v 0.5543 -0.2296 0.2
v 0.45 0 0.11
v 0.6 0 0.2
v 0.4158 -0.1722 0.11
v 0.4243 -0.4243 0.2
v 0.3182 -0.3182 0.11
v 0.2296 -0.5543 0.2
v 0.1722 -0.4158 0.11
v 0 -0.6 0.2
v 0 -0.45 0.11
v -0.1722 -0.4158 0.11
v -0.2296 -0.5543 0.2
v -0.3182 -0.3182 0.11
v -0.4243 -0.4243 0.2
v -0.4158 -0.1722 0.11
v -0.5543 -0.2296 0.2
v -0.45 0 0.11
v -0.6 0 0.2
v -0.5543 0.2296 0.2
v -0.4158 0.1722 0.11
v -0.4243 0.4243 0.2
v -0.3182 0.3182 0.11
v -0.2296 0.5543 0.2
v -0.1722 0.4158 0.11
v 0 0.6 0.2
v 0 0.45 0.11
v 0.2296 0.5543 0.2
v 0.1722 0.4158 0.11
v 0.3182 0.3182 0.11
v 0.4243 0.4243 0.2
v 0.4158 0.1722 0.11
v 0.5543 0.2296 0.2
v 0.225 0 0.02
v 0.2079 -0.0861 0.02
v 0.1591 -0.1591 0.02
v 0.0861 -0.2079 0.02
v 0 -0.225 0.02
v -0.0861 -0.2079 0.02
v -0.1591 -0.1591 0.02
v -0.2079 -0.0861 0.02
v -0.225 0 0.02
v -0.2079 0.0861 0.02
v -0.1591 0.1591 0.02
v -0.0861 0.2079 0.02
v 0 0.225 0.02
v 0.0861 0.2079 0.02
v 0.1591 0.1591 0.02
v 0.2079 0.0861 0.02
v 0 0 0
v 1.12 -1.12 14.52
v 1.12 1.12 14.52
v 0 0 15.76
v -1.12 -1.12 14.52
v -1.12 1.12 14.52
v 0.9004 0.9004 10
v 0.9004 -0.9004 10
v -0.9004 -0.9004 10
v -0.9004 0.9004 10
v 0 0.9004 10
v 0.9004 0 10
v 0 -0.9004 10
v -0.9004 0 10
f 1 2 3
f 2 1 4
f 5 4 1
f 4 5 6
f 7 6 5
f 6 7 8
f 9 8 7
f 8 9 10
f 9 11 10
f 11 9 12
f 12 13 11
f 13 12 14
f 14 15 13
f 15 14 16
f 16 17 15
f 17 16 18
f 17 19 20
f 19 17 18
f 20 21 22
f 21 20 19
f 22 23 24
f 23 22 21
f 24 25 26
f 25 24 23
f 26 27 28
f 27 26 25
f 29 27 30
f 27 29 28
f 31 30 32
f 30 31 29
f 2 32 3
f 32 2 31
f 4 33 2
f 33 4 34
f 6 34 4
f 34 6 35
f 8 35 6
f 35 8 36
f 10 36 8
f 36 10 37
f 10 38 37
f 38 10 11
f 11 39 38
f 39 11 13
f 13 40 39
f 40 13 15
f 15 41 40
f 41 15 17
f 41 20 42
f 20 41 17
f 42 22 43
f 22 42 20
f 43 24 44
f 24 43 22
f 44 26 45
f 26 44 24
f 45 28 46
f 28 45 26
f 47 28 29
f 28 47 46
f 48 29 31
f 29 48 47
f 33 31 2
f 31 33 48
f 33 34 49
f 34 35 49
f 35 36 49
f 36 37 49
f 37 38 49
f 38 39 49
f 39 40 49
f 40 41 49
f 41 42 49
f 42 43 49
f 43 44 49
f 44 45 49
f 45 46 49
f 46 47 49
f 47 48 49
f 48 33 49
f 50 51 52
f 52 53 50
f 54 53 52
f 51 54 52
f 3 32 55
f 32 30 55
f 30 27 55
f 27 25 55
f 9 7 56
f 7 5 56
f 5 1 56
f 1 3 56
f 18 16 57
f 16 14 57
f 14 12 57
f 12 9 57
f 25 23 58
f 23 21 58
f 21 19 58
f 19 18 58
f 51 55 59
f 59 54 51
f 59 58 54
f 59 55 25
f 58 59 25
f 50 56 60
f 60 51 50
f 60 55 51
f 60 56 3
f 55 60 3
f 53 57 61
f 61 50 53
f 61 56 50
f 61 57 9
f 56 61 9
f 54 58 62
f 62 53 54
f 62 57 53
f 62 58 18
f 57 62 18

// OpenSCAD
// file: ../../p/4-4edge.scad
use <../lib.scad>
function ldraw_lib__4_4edge() = [
// 0 Circle 1.0
// 0 Name: 4-4edge.dat
// 0 Author: James Jessiman
// 0 !LDRAW_ORG Primitive UPDATE 2017-01
// 0 !LICENSE Licensed under CC BY 4.0 : see CAreadme.txt
// 
// 0 BFC CERTIFY CCW
  [0,"BFC","CERTIFY"],
  [0,"BFC","CCW"],
// 
// 0 !HISTORY 1998-12-15 [PTadmin] Official Update 1998-10
// 0 !HISTORY 2005-12-28 [PTadmin] Official Update 2005-01
// 0 !HISTORY 2007-06-24 [PTadmin] Header formatted for Contributor Agreement
// 0 !HISTORY 2008-07-01 [PTadmin] Official Update 2008-01
// 0 !HISTORY 2017-01-15 [Steffen] BFCed
// 0 !HISTORY 2017-12-30 [PTadmin] Official Update 2017-01
// 
// 
// 2 24 1 0 0 0.9239 0 0.3827
  [2,24,1,0,0,0.9239,0,0.3827],
// 2 24 0.9239 0 0.3827 0.7071 0 0.7071
  [2,24,0.9239,0,0.3827,0.7071,0,0.7071],
// 2 24 0.7071 0 0.7071 0.3827 0 0.9239
  [2,24,0.7071,0,0.7071,0.3827,0,0.9239],
// 2 24 0.3827 0 0.9239 0 0 1
  [2,24,0.3827,0,0.9239,0,0,1],
// 2 24 0 0 1 -0.3827 0 0.9239
  [2,24,0,0,1,-0.3827,0,0.9239],
// 2 24 -0.3827 0 0.9239 -0.7071 0 0.7071
  [2,24,-0.3827,0,0.9239,-0.7071,0,0.7071],
// 2 24 -0.7071 0 0.7071 -0.9239 0 0.3827
  [2,24,-0.7071,0,0.7071,-0.9239,0,0.3827],
// 2 24 -0.9239 0 0.3827 -1 0 -0
  [2,24,-0.9239,0,0.3827,-1,0,-0],
// 2 24 -1 0 -0 -0.9239 0 -0.3827
  [2,24,-1,0,-0,-0.9239,0,-0.3827],
// 2 24 -0.9239 0 -0.3827 -0.7071 0 -0.7071
  [2,24,-0.9239,0,-0.3827,-0.7071,0,-0.7071],
// 2 24 -0.7071 0 -0.7071 -0.3827 0 -0.9239
  [2,24,-0.7071,0,-0.7071,-0.3827,0,-0.9239],
// 2 24 -0.3827 0 -0.9239 0 0 -1
  [2,24,-0.3827,0,-0.9239,0,0,-1],
// 2 24 0 0 -1 0.3827 0 -0.9239
  [2,24,0,0,-1,0.3827,0,-0.9239],
// 2 24 0.3827 0 -0.9239 0.7071 0 -0.7071
  [2,24,0.3827,0,-0.9239,0.7071,0,-0.7071],
// 2 24 0.7071 0 -0.7071 0.9239 0 -0.3827
  [2,24,0.7071,0,-0.7071,0.9239,0,-0.3827],
// 2 24 0.9239 0 -0.3827 1 0 0
  [2,24,0.9239,0,-0.3827,1,0,0],
];
module ldraw_lib__4_4edge(step=0, col=false, unit=2/5, alt=false, line=0.2, solid=!$preview)
    makepoly(ldraw_lib__4_4edge(), step=step, col=col, unit=unit, alt=alt, line=line, solid=solid);
ldraw_lib__4_4edge(line=0.2);
// file: ../../p/4-4con3.scad
use <../lib.scad>
function ldraw_lib__4_4con3() = [
// 0 Cone  3 x 1.0
// 0 Name: 4-4con3.dat
// 0 Author: Niels Karsdorp [nielsk]
// 0 !LDRAW_ORG Primitive UPDATE 2003-02
// 0 !LICENSE Licensed under CC BY 4.0 : see CAreadme.txt
// 
// 0 BFC CERTIFY CCW
  [0,"BFC","CERTIFY"],
  [0,"BFC","CCW"],
// 
// 0 !HISTORY 2003-08-01 [PTadmin] Official Update 2003-02
// 0 !HISTORY 2007-06-24 [PTadmin] Header formatted for Contributor Agreement
// 0 !HISTORY 2008-07-01 [PTadmin] Official Update 2008-01
// 
// 
// 5 24 3 1 0 4 0 0 2.7717 1 1.1481 2.7717 1 -1.1481
  [5,24,3,1,0,4,0,0,2.7717,1,1.1481,2.7717,1,-1.1481],
// 5 24 2.7717 1 1.1481 3.6956 0 1.5308 2.1213 1 2.1213 3 1 0
  [5,24,2.7717,1,1.1481,3.6956,0,1.5308,2.1213,1,2.1213,3,1,0],
// 5 24 2.1213 1 2.1213 2.8284 0 2.8284 1.1481 1 2.7717 2.7717 1 1.1481
  [5,24,2.1213,1,2.1213,2.8284,0,2.8284,1.1481,1,2.7717,2.7717,1,1.1481],
// 5 24 1.1481 1 2.7717 1.5308 0 3.6956 0 1 3 2.1213 1 2.1213
  [5,24,1.1481,1,2.7717,1.5308,0,3.6956,0,1,3,2.1213,1,2.1213],
// 5 24 0 1 3 0 0 4 -1.1481 1 2.7717 1.1481 1 2.7717
  [5,24,0,1,3,0,0,4,-1.1481,1,2.7717,1.1481,1,2.7717],
// 5 24 -1.1481 1 2.7717 -1.5308 0 3.6956 -2.1213 1 2.1213 0 1 3
  [5,24,-1.1481,1,2.7717,-1.5308,0,3.6956,-2.1213,1,2.1213,0,1,3],
// 5 24 -2.1213 1 2.1213 -2.8284 0 2.8284 -2.7717 1 1.1481 -1.1481 1 2.7717
  [5,24,-2.1213,1,2.1213,-2.8284,0,2.8284,-2.7717,1,1.1481,-1.1481,1,2.7717],
// 5 24 -2.7717 1 1.1481 -3.6956 0 1.5308 -3 1 0 -2.1213 1 2.1213
  [5,24,-2.7717,1,1.1481,-3.6956,0,1.5308,-3,1,0,-2.1213,1,2.1213],
// 5 24 -3 1 0 -4 0 0 -2.7717 1 -1.1481 -2.7717 1 1.1481
  [5,24,-3,1,0,-4,0,0,-2.7717,1,-1.1481,-2.7717,1,1.1481],
// 5 24 -2.7717 1 -1.1481 -3.6956 0 -1.5308 -2.1213 1 -2.1213 -3 1 0
  [5,24,-2.7717,1,-1.1481,-3.6956,0,-1.5308,-2.1213,1,-2.1213,-3,1,0],
// 5 24 -2.1213 1 -2.1213 -2.8284 0 -2.8284 -1.1481 1 -2.7717 -2.7717 1 -1.1481
  [5,24,-2.1213,1,-2.1213,-2.8284,0,-2.8284,-1.1481,1,-2.7717,-2.7717,1,-1.1481],
// 5 24 -1.1481 1 -2.7717 -1.5308 0 -3.6956 0 1 -3 -2.1213 1 -2.1213
  [5,24,-1.1481,1,-2.7717,-1.5308,0,-3.6956,0,1,-3,-2.1213,1,-2.1213],
// 5 24 0 1 -3 0 0 -4 1.1481 1 -2.7717 -1.1481 1 -2.7717
  [5,24,0,1,-3,0,0,-4,1.1481,1,-2.7717,-1.1481,1,-2.7717],
// 5 24 1.1481 1 -2.7717 1.5308 0 -3.6956 2.1213 1 -2.1213 0 1 -3
  [5,24,1.1481,1,-2.7717,1.5308,0,-3.6956,2.1213,1,-2.1213,0,1,-3],
// 5 24 2.1213 1 -2.1213 2.8284 0 -2.8284 2.7717 1 -1.1481 1.1481 1 -2.7717
  [5,24,2.1213,1,-2.1213,2.8284,0,-2.8284,2.7717,1,-1.1481,1.1481,1,-2.7717],
// 5 24 2.7717 1 -1.1481 3.6956 0 -1.5308 3 1 0 2.1213 1 -2.1213
  [5,24,2.7717,1,-1.1481,3.6956,0,-1.5308,3,1,0,2.1213,1,-2.1213],
// 
// 4 16 3 1 0 2.7717 1 1.1481 3.6956 0 1.5308 4 0 0
  [4,16,3,1,0,2.7717,1,1.1481,3.6956,0,1.5308,4,0,0],
// 4 16 2.7717 1 1.1481 2.1213 1 2.1213 2.8284 0 2.8284 3.6956 0 1.5308
  [4,16,2.7717,1,1.1481,2.1213,1,2.1213,2.8284,0,2.8284,3.6956,0,1.5308],
// 4 16 2.1213 1 2.1213 1.1481 1 2.7717 1.5308 0 3.6956 2.8284 0 2.8284
  [4,16,2.1213,1,2.1213,1.1481,1,2.7717,1.5308,0,3.6956,2.8284,0,2.8284],
// 4 16 1.1481 1 2.7717 0 1 3 0 0 4 1.5308 0 3.6956
  [4,16,1.1481,1,2.7717,0,1,3,0,0,4,1.5308,0,3.6956],
// 4 16 0 1 3 -1.1481 1 2.7717 -1.5308 0 3.6956 0 0 4
  [4,16,0,1,3,-1.1481,1,2.7717,-1.5308,0,3.6956,0,0,4],
// 4 16 -1.1481 1 2.7717 -2.1213 1 2.1213 -2.8284 0 2.8284 -1.5308 0 3.6956
  [4,16,-1.1481,1,2.7717,-2.1213,1,2.1213,-2.8284,0,2.8284,-1.5308,0,3.6956],
// 4 16 -2.1213 1 2.1213 -2.7717 1 1.1481 -3.6956 0 1.5308 -2.8284 0 2.8284
  [4,16,-2.1213,1,2.1213,-2.7717,1,1.1481,-3.6956,0,1.5308,-2.8284,0,2.8284],
// 4 16 -2.7717 1 1.1481 -3 1 0 -4 0 0 -3.6956 0 1.5308
  [4,16,-2.7717,1,1.1481,-3,1,0,-4,0,0,-3.6956,0,1.5308],
// 4 16 -3 1 0 -2.7717 1 -1.1481 -3.6956 0 -1.5308 -4 0 0
  [4,16,-3,1,0,-2.7717,1,-1.1481,-3.6956,0,-1.5308,-4,0,0],
// 4 16 -2.7717 1 -1.1481 -2.1213 1 -2.1213 -2.8284 0 -2.8284 -3.6956 0 -1.5308
  [4,16,-2.7717,1,-1.1481,-2.1213,1,-2.1213,-2.8284,0,-2.8284,-3.6956,0,-1.5308],
// 4 16 -2.1213 1 -2.1213 -1.1481 1 -2.7717 -1.5308 0 -3.6956 -2.8284 0 -2.8284
  [4,16,-2.1213,1,-2.1213,-1.1481,1,-2.7717,-1.5308,0,-3.6956,-2.8284,0,-2.8284],
// 4 16 -1.1481 1 -2.7717 0 1 -3 0 0 -4 -1.5308 0 -3.6956
  [4,16,-1.1481,1,-2.7717,0,1,-3,0,0,-4,-1.5308,0,-3.6956],
// 4 16 0 1 -3 1.1481 1 -2.7717 1.5308 0 -3.6956 0 0 -4
  [4,16,0,1,-3,1.1481,1,-2.7717,1.5308,0,-3.6956,0,0,-4],
// 4 16 1.1481 1 -2.7717 2.1213 1 -2.1213 2.8284 0 -2.8284 1.5308 0 -3.6956
  [4,16,1.1481,1,-2.7717,2.1213,1,-2.1213,2.8284,0,-2.8284,1.5308,0,-3.6956],
// 4 16 2.1213 1 -2.1213 2.7717 1 -1.1481 3.6956 0 -1.5308 2.8284 0 -2.8284
  [4,16,2.1213,1,-2.1213,2.7717,1,-1.1481,3.6956,0,-1.5308,2.8284,0,-2.8284],
// 4 16 2.7717 1 -1.1481 3 1 0 4 0 0 3.6956 0 -1.5308
  [4,16,2.7717,1,-1.1481,3,1,0,4,0,0,3.6956,0,-1.5308],
// 
// 0
// 
];
module ldraw_lib__4_4con3(step=0, col=false, unit=2/5, alt=false, line=0.2, solid=!$preview)
    makepoly(ldraw_lib__4_4con3(), step=step, col=col, unit=unit, alt=alt, line=line, solid=solid);
ldraw_lib__4_4con3(line=0.2);
// file: ../../p/4-4con1.scad
use <../lib.scad>
function ldraw_lib__4_4con1() = [
// 0 Cone  1 x 1.0
// 0 Name: 4-4con1.dat
// 0 Author: Steve Bliss [sbliss]
// 0 !LDRAW_ORG Primitive UPDATE 2012-01
// 0 !LICENSE Licensed under CC BY 4.0 : see CAreadme.txt
// 
// 0 BFC CERTIFY CCW
  [0,"BFC","CERTIFY"],
  [0,"BFC","CCW"],
// 
// 0 !HISTORY 1999-08-19 [sbliss] Renamed 4-4con12.dat to 4-4con1.dat, Moved all conditional lines before quads
// 0 !HISTORY 2000-05-07 [PTadmin] Official Update 2000-01
// 0 !HISTORY 2002-12-11 [cwdee] Standardised title and made BFC compliant
// 0 !HISTORY 2003-08-01 [PTadmin] Official Update 2003-02
// 0 !HISTORY 2007-06-24 [PTadmin] Header formatted for Contributor Agreement
// 0 !HISTORY 2008-07-01 [PTadmin] Official Update 2008-01
// 0 !HISTORY 2012-02-16 [Philo] Changed to CCW, reordered
// 0 !HISTORY 2012-03-30 [PTadmin] Official Update 2012-01
// 
// 
// 5 24 1 1 0 2 0 0 0.9239 1 -0.3827 0.9239 1 0.3827
  [5,24,1,1,0,2,0,0,0.9239,1,-0.3827,0.9239,1,0.3827],
// 5 24 0.9239 1 0.3827 1.8478 0 0.7654 1 1 0 0.7071 1 0.7071
  [5,24,0.9239,1,0.3827,1.8478,0,0.7654,1,1,0,0.7071,1,0.7071],
// 5 24 0.7071 1 0.7071 1.4142 0 1.4142 0.9239 1 0.3827 0.3827 1 0.9239
  [5,24,0.7071,1,0.7071,1.4142,0,1.4142,0.9239,1,0.3827,0.3827,1,0.9239],
// 5 24 0.3827 1 0.9239 0.7654 0 1.8478 0.7071 1 0.7071 0 1 1
  [5,24,0.3827,1,0.9239,0.7654,0,1.8478,0.7071,1,0.7071,0,1,1],
// 5 24 0 1 1 0 0 2 0.3827 1 0.9239 -0.3827 1 0.9239
  [5,24,0,1,1,0,0,2,0.3827,1,0.9239,-0.3827,1,0.9239],
// 5 24 -0.3827 1 0.9239 -0.7654 0 1.8478 0 1 1 -0.7071 1 0.7071
  [5,24,-0.3827,1,0.9239,-0.7654,0,1.8478,0,1,1,-0.7071,1,0.7071],
// 5 24 -0.7071 1 0.7071 -1.4142 0 1.4142 -0.3827 1 0.9239 -0.9239 1 0.3827
  [5,24,-0.7071,1,0.7071,-1.4142,0,1.4142,-0.3827,1,0.9239,-0.9239,1,0.3827],
// 5 24 -0.9239 1 0.3827 -1.8478 0 0.7654 -0.7071 1 0.7071 -1 1 0
  [5,24,-0.9239,1,0.3827,-1.8478,0,0.7654,-0.7071,1,0.7071,-1,1,0],
// 5 24 -1 1 0 -2 0 0 -0.9239 1 0.3827 -0.9239 1 -0.3827
  [5,24,-1,1,0,-2,0,0,-0.9239,1,0.3827,-0.9239,1,-0.3827],
// 5 24 -0.9239 1 -0.3827 -1.8478 0 -0.7654 -1 1 0 -0.7071 1 -0.7071
  [5,24,-0.9239,1,-0.3827,-1.8478,0,-0.7654,-1,1,0,-0.7071,1,-0.7071],
// 5 24 -0.7071 1 -0.7071 -1.4142 0 -1.4142 -0.9239 1 -0.3827 -0.3827 1 -0.9239
  [5,24,-0.7071,1,-0.7071,-1.4142,0,-1.4142,-0.9239,1,-0.3827,-0.3827,1,-0.9239],
// 5 24 -0.3827 1 -0.9239 -0.7654 0 -1.8478 -0.7071 1 -0.7071 0 1 -1
  [5,24,-0.3827,1,-0.9239,-0.7654,0,-1.8478,-0.7071,1,-0.7071,0,1,-1],
// 5 24 0 1 -1 0 0 -2 -0.3827 1 -0.9239 0.3827 1 -0.9239
  [5,24,0,1,-1,0,0,-2,-0.3827,1,-0.9239,0.3827,1,-0.9239],
// 5 24 0.3827 1 -0.9239 0.7654 0 -1.8478 0 1 -1 0.7071 1 -0.7071
  [5,24,0.3827,1,-0.9239,0.7654,0,-1.8478,0,1,-1,0.7071,1,-0.7071],
// 5 24 0.7071 1 -0.7071 1.4142 0 -1.4142 0.3827 1 -0.9239 0.9239 1 -0.3827
  [5,24,0.7071,1,-0.7071,1.4142,0,-1.4142,0.3827,1,-0.9239,0.9239,1,-0.3827],
// 5 24 0.9239 1 -0.3827 1.8478 0 -0.7654 0.7071 1 -0.7071 1 1 0
  [5,24,0.9239,1,-0.3827,1.8478,0,-0.7654,0.7071,1,-0.7071,1,1,0],
// 
// 4 16 2 0 0 1 1 0 0.9239 1 0.3827 1.8478 0 0.7654
  [4,16,2,0,0,1,1,0,0.9239,1,0.3827,1.8478,0,0.7654],
// 4 16 1.8478 0 0.7654 0.9239 1 0.3827 0.7071 1 0.7071 1.4142 0 1.4142
  [4,16,1.8478,0,0.7654,0.9239,1,0.3827,0.7071,1,0.7071,1.4142,0,1.4142],
// 4 16 1.4142 0 1.4142 0.7071 1 0.7071 0.3827 1 0.9239 0.7654 0 1.8478
  [4,16,1.4142,0,1.4142,0.7071,1,0.7071,0.3827,1,0.9239,0.7654,0,1.8478],
// 4 16 0.7654 0 1.8478 0.3827 1 0.9239 0 1 1 0 0 2
  [4,16,0.7654,0,1.8478,0.3827,1,0.9239,0,1,1,0,0,2],
// 4 16 0 0 2 0 1 1 -0.3827 1 0.9239 -0.7654 0 1.8478
  [4,16,0,0,2,0,1,1,-0.3827,1,0.9239,-0.7654,0,1.8478],
// 4 16 -0.7654 0 1.8478 -0.3827 1 0.9239 -0.7071 1 0.7071 -1.4142 0 1.4142
  [4,16,-0.7654,0,1.8478,-0.3827,1,0.9239,-0.7071,1,0.7071,-1.4142,0,1.4142],
// 4 16 -1.4142 0 1.4142 -0.7071 1 0.7071 -0.9239 1 0.3827 -1.8478 0 0.7654
  [4,16,-1.4142,0,1.4142,-0.7071,1,0.7071,-0.9239,1,0.3827,-1.8478,0,0.7654],
// 4 16 -1.8478 0 0.7654 -0.9239 1 0.3827 -1 1 0 -2 0 0
  [4,16,-1.8478,0,0.7654,-0.9239,1,0.3827,-1,1,0,-2,0,0],
// 4 16 -2 0 0 -1 1 0 -0.9239 1 -0.3827 -1.8478 0 -0.7654
  [4,16,-2,0,0,-1,1,0,-0.9239,1,-0.3827,-1.8478,0,-0.7654],
// 4 16 -1.8478 0 -0.7654 -0.9239 1 -0.3827 -0.7071 1 -0.7071 -1.4142 0 -1.4142
  [4,16,-1.8478,0,-0.7654,-0.9239,1,-0.3827,-0.7071,1,-0.7071,-1.4142,0,-1.4142],
// 4 16 -1.4142 0 -1.4142 -0.7071 1 -0.7071 -0.3827 1 -0.9239 -0.7654 0 -1.8478
  [4,16,-1.4142,0,-1.4142,-0.7071,1,-0.7071,-0.3827,1,-0.9239,-0.7654,0,-1.8478],
// 4 16 -0.7654 0 -1.8478 -0.3827 1 -0.9239 0 1 -1 0 0 -2
  [4,16,-0.7654,0,-1.8478,-0.3827,1,-0.9239,0,1,-1,0,0,-2],
// 4 16 0 0 -2 0 1 -1 0.3827 1 -0.9239 0.7654 0 -1.8478
  [4,16,0,0,-2,0,1,-1,0.3827,1,-0.9239,0.7654,0,-1.8478],
// 4 16 0.7654 0 -1.8478 0.3827 1 -0.9239 0.7071 1 -0.7071 1.4142 0 -1.4142
  [4,16,0.7654,0,-1.8478,0.3827,1,-0.9239,0.7071,1,-0.7071,1.4142,0,-1.4142],
// 4 16 1.4142 0 -1.4142 0.7071 1 -0.7071 0.9239 1 -0.3827 1.8478 0 -0.7654
  [4,16,1.4142,0,-1.4142,0.7071,1,-0.7071,0.9239,1,-0.3827,1.8478,0,-0.7654],
// 4 16 1.8478 0 -0.7654 0.9239 1 -0.3827 1 1 0 2 0 0
  [4,16,1.8478,0,-0.7654,0.9239,1,-0.3827,1,1,0,2,0,0],
];
module ldraw_lib__4_4con1(step=0, col=false, unit=2/5, alt=false, line=0.2, solid=!$preview)
    makepoly(ldraw_lib__4_4con1(), step=step, col=col, unit=unit, alt=alt, line=line, solid=solid);
ldraw_lib__4_4con1(line=0.2);
// file: ../../p/4-4con0.scad
use <../lib.scad>
function ldraw_lib__4_4con0() = [
// 0 Cone  0 x 1.0
// 0 Name: 4-4con0.dat
// 0 Author: William Howard [WilliamH]
// 0 !LDRAW_ORG Primitive UPDATE 2009-03
// 0 !LICENSE Licensed under CC BY 2.0 and CC BY 4.0 : see CAreadme.txt
// 
// 0 BFC CERTIFY CCW
  [0,"BFC","CERTIFY"],
  [0,"BFC","CCW"],
// 
// 0 !HISTORY 2009-12-29 [PTadmin] Official Update 2009-03
// 
// 
// 3 16 0 1 0 0.9239 0 0.3827 1 0 0
  [3,16,0,1,0,0.9239,0,0.3827,1,0,0],
// 3 16 0 1 0 0.7071 0 0.7071 0.9239 0 0.3827
  [3,16,0,1,0,0.7071,0,0.7071,0.9239,0,0.3827],
// 3 16 0 1 0 0.3827 0 0.9239 0.7071 0 0.7071
  [3,16,0,1,0,0.3827,0,0.9239,0.7071,0,0.7071],
// 3 16 0 1 0 0 0 1 0.3827 0 0.9239
  [3,16,0,1,0,0,0,1,0.3827,0,0.9239],
// 3 16 0 1 0 -0.3827 0 0.9239 0 0 1
  [3,16,0,1,0,-0.3827,0,0.9239,0,0,1],
// 3 16 0 1 0 -0.7071 0 0.7071 -0.3827 0 0.9239
  [3,16,0,1,0,-0.7071,0,0.7071,-0.3827,0,0.9239],
// 3 16 0 1 0 -0.9239 0 0.3827 -0.7071 0 0.7071
  [3,16,0,1,0,-0.9239,0,0.3827,-0.7071,0,0.7071],
// 3 16 0 1 0 -1 0 0 -0.9239 0 0.3827
  [3,16,0,1,0,-1,0,0,-0.9239,0,0.3827],
// 3 16 0 1 0 -0.9239 0 -0.3827 -1 0 0
  [3,16,0,1,0,-0.9239,0,-0.3827,-1,0,0],
// 3 16 0 1 0 -0.7071 0 -0.7071 -0.9239 0 -0.3827
  [3,16,0,1,0,-0.7071,0,-0.7071,-0.9239,0,-0.3827],
// 3 16 0 1 0 -0.3827 0 -0.9239 -0.7071 0 -0.7071
  [3,16,0,1,0,-0.3827,0,-0.9239,-0.7071,0,-0.7071],
// 3 16 0 1 0 0 0 -1 -0.3827 0 -0.9239
  [3,16,0,1,0,0,0,-1,-0.3827,0,-0.9239],
// 3 16 0 1 0 0.3827 0 -0.9239 0 0 -1
  [3,16,0,1,0,0.3827,0,-0.9239,0,0,-1],
// 3 16 0 1 0 0.7071 0 -0.7071 0.3827 0 -0.9239
  [3,16,0,1,0,0.7071,0,-0.7071,0.3827,0,-0.9239],
// 3 16 0 1 0 0.9239 0 -0.3827 0.7071 0 -0.7071
  [3,16,0,1,0,0.9239,0,-0.3827,0.7071,0,-0.7071],
// 3 16 0 1 0 1 0 0 0.9239 0 -0.3827
  [3,16,0,1,0,1,0,0,0.9239,0,-0.3827],
// 
// 0 conditional lines
// 5 24 0 1 0 1 0 0 0.9239 0 -0.3827 0.9239 0 0.3827
  [5,24,0,1,0,1,0,0,0.9239,0,-0.3827,0.9239,0,0.3827],
// 5 24 0 1 0 0.9239 0 0.3827 1 0 0 0.7071 0 0.7071
  [5,24,0,1,0,0.9239,0,0.3827,1,0,0,0.7071,0,0.7071],
// 5 24 0 1 0 0.7071 0 0.7071 0.9239 0 0.3827 0.3827 0 0.9239
  [5,24,0,1,0,0.7071,0,0.7071,0.9239,0,0.3827,0.3827,0,0.9239],
// 5 24 0 1 0 0.3827 0 0.9239 0.7071 0 0.7071 0 0 1
  [5,24,0,1,0,0.3827,0,0.9239,0.7071,0,0.7071,0,0,1],
// 5 24 0 1 0 0 0 1 0.3827 0 0.9239 -0.3827 0 0.9239
  [5,24,0,1,0,0,0,1,0.3827,0,0.9239,-0.3827,0,0.9239],
// 5 24 0 1 0 -0.3827 0 0.9239 0 0 1 -0.7071 0 0.7071
  [5,24,0,1,0,-0.3827,0,0.9239,0,0,1,-0.7071,0,0.7071],
// 5 24 0 1 0 -0.7071 0 0.7071 -0.3827 0 0.9239 -0.9239 0 0.3827
  [5,24,0,1,0,-0.7071,0,0.7071,-0.3827,0,0.9239,-0.9239,0,0.3827],
// 5 24 0 1 0 -0.9239 0 0.3827 -0.7071 0 0.7071 -1 0 0
  [5,24,0,1,0,-0.9239,0,0.3827,-0.7071,0,0.7071,-1,0,0],
// 5 24 0 1 0 -1 0 0 -0.9239 0 0.3827 -0.9239 0 -0.3827
  [5,24,0,1,0,-1,0,0,-0.9239,0,0.3827,-0.9239,0,-0.3827],
// 5 24 0 1 0 -0.9239 0 -0.3827 -1 0 0 -0.7071 0 -0.7071
  [5,24,0,1,0,-0.9239,0,-0.3827,-1,0,0,-0.7071,0,-0.7071],
// 5 24 0 1 0 -0.7071 0 -0.7071 -0.9239 0 -0.3827 -0.3827 0 -0.9239
  [5,24,0,1,0,-0.7071,0,-0.7071,-0.9239,0,-0.3827,-0.3827,0,-0.9239],
// 5 24 0 1 0 -0.3827 0 -0.9239 -0.7071 0 -0.7071 0 0 -1
  [5,24,0,1,0,-0.3827,0,-0.9239,-0.7071,0,-0.7071,0,0,-1],
// 5 24 0 1 0 0 0 -1 -0.3827 0 -0.9239 0.3827 0 -0.9239
  [5,24,0,1,0,0,0,-1,-0.3827,0,-0.9239,0.3827,0,-0.9239],
// 5 24 0 1 0 0.3827 0 -0.9239 0 0 -1 0.7071 0 -0.7071
  [5,24,0,1,0,0.3827,0,-0.9239,0,0,-1,0.7071,0,-0.7071],
// 5 24 0 1 0 0.7071 0 -0.7071 0.3827 0 -0.9239 0.9239 0 -0.3827
  [5,24,0,1,0,0.7071,0,-0.7071,0.3827,0,-0.9239,0.9239,0,-0.3827],
// 5 24 0 1 0 0.9239 0 -0.3827 0.7071 0 -0.7071 1 0 0
  [5,24,0,1,0,0.9239,0,-0.3827,0.7071,0,-0.7071,1,0,0],
// 
// 0 end of file
];
module ldraw_lib__4_4con0(step=0, col=false, unit=2/5, alt=false, line=0.2, solid=!$preview)
    makepoly(ldraw_lib__4_4con0(), step=step, col=col, unit=unit, alt=alt, line=line, solid=solid);
ldraw_lib__4_4con0(line=0.2);
// file: ../../p/bump5000.scad
use <../lib.scad>
use <4-4con0.scad>
use <4-4con1.scad>
use <4-4con3.scad>
use <4-4edge.scad>
function ldraw_lib__bump5000() = [
// 0 Bump 1.0 x 0.5
// 0 Name: bump5000.dat
// 0 Author: Magnus Forsberg [MagFors]
// 0 !LDRAW_ORG Primitive UPDATE 2010-02
// 0 !LICENSE Licensed under CC BY 4.0 : see CAreadme.txt
// 
// 0 !HELP This file creates a bump with radius= 1 and height= 0.5 LDU
// 
// 0 BFC CERTIFY CCW
  [0,"BFC","CERTIFY"],
  [0,"BFC","CCW"],
// 
// 0 !HISTORY 2010-07-05 [PTadmin] Official Update 2010-02
// 
// 
// 1 16 0 0 0 0.25 0 0 0 -0.225 0 0 0 -0.25 4-4con3.dat
  [1,16,0,0,0,0.25,0,0,0,-0.225,0,0,0,-0.25, ldraw_lib__4_4con3()],
// 1 16 0 -0.225 0 0.375 0 0 0 -0.225 0 0 0 -0.375 4-4con1.dat
  [1,16,0,-0.225,0,0.375,0,0,0,-0.225,0,0,0,-0.375, ldraw_lib__4_4con1()],
// 1 16 0 -0.45 0 0.375 0 0 0 -0.05 0 0 0 -0.375 4-4con0.dat
  [1,16,0,-0.45,0,0.375,0,0,0,-0.05,0,0,0,-0.375, ldraw_lib__4_4con0()],
// 1 16 0 0 0 1 0 0 0 1 0 0 0 1 4-4edge.dat
  [1,16,0,0,0,1,0,0,0,1,0,0,0,1, ldraw_lib__4_4edge()],
// 5 24 0.692925 -0.225 -0.287025 0.75 -0.225 0 0.9239 0 -0.3827 0.375 -0.45 0
  [5,24,0.692925,-0.225,-0.287025,0.75,-0.225,0,0.9239,0,-0.3827,0.375,-0.45,0],
// 5 24 0.530325 -0.225 -0.530325 0.692925 -0.225 -0.287025 0.7071 0 -0.7071 0.3464625 -0.45 -0.1435125
  [5,24,0.530325,-0.225,-0.530325,0.692925,-0.225,-0.287025,0.7071,0,-0.7071,0.3464625,-0.45,-0.1435125],
// 5 24 0.287025 -0.225 -0.692925 0.530325 -0.225 -0.530325 0.3827 0 -0.9239 0.2651625 -0.45 -0.2651625
  [5,24,0.287025,-0.225,-0.692925,0.530325,-0.225,-0.530325,0.3827,0,-0.9239,0.2651625,-0.45,-0.2651625],
// 5 24 0 -0.225 -0.75 0.287025 -0.225 -0.692925 0 0 -1 0.1435125 -0.45 -0.3464625
  [5,24,0,-0.225,-0.75,0.287025,-0.225,-0.692925,0,0,-1,0.1435125,-0.45,-0.3464625],
// 5 24 -0.287025 -0.225 -0.692925 0 -0.225 -0.75 -0.3827 0 -0.9239 0 -0.45 -0.375
  [5,24,-0.287025,-0.225,-0.692925,0,-0.225,-0.75,-0.3827,0,-0.9239,0,-0.45,-0.375],
// 5 24 -0.530325 -0.225 -0.530325 -0.287025 -0.225 -0.692925 -0.7071 0 -0.7071 -0.1435125 -0.45 -0.3464625
  [5,24,-0.530325,-0.225,-0.530325,-0.287025,-0.225,-0.692925,-0.7071,0,-0.7071,-0.1435125,-0.45,-0.3464625],
// 5 24 -0.692925 -0.225 -0.287025 -0.530325 -0.225 -0.530325 -0.9239 0 -0.3827 -0.2651625 -0.45 -0.2651625
  [5,24,-0.692925,-0.225,-0.287025,-0.530325,-0.225,-0.530325,-0.9239,0,-0.3827,-0.2651625,-0.45,-0.2651625],
// 5 24 -0.75 -0.225 0 -0.692925 -0.225 -0.287025 -1 0 0 -0.3464625 -0.45 -0.1435125
  [5,24,-0.75,-0.225,0,-0.692925,-0.225,-0.287025,-1,0,0,-0.3464625,-0.45,-0.1435125],
// 5 24 -0.692925 -0.225 0.287025 -0.75 -0.225 0 -0.9239 0 0.3827 -0.375 -0.45 0
  [5,24,-0.692925,-0.225,0.287025,-0.75,-0.225,0,-0.9239,0,0.3827,-0.375,-0.45,0],
// 5 24 -0.530325 -0.225 0.530325 -0.692925 -0.225 0.287025 -0.7071 0 0.7071 -0.3464625 -0.45 0.1435125
  [5,24,-0.530325,-0.225,0.530325,-0.692925,-0.225,0.287025,-0.7071,0,0.7071,-0.3464625,-0.45,0.1435125],
// 5 24 -0.287025 -0.225 0.692925 -0.530325 -0.225 0.530325 -0.3827 0 0.9239 -0.2651625 -0.45 0.2651625
  [5,24,-0.287025,-0.225,0.692925,-0.530325,-0.225,0.530325,-0.3827,0,0.9239,-0.2651625,-0.45,0.2651625],
// 5 24 0 -0.225 0.75 -0.287025 -0.225 0.692925 0 0 1 -0.1435125 -0.45 0.3464625
  [5,24,0,-0.225,0.75,-0.287025,-0.225,0.692925,0,0,1,-0.1435125,-0.45,0.3464625],
// 5 24 0.287025 -0.225 0.692925 0 -0.225 0.75 0.3827 0 0.9239 0 -0.45 0.375
  [5,24,0.287025,-0.225,0.692925,0,-0.225,0.75,0.3827,0,0.9239,0,-0.45,0.375],
// 5 24 0.530325 -0.225 0.530325 0.287025 -0.225 0.692925 0.7071 0 0.7071 0.1435125 -0.45 0.3464625
  [5,24,0.530325,-0.225,0.530325,0.287025,-0.225,0.692925,0.7071,0,0.7071,0.1435125,-0.45,0.3464625],
// 5 24 0.692925 -0.225 0.287025 0.530325 -0.225 0.530325 0.9239 0 0.3827 0.2651625 -0.45 0.2651625
  [5,24,0.692925,-0.225,0.287025,0.530325,-0.225,0.530325,0.9239,0,0.3827,0.2651625,-0.45,0.2651625],
// 5 24 0.75 -0.225 0 0.692925 -0.225 0.287025 1 0 0 0.3464625 -0.45 0.1435125
  [5,24,0.75,-0.225,0,0.692925,-0.225,0.287025,1,0,0,0.3464625,-0.45,0.1435125],
// 5 24 0 -0.45 -0.375 -0.1435125 -0.45 -0.3464625 -0.287025 -0.225 -0.692925 0 -0.5 0
  [5,24,0,-0.45,-0.375,-0.1435125,-0.45,-0.3464625,-0.287025,-0.225,-0.692925,0,-0.5,0],
// 5 24 -0.1435125 -0.45 -0.3464625 -0.2651625 -0.45 -0.2651625 -0.530325 -0.225 -0.530325 0 -0.5 0
  [5,24,-0.1435125,-0.45,-0.3464625,-0.2651625,-0.45,-0.2651625,-0.530325,-0.225,-0.530325,0,-0.5,0],
// 5 24 -0.2651625 -0.45 -0.2651625 -0.3464625 -0.45 -0.1435125 -0.692925 -0.225 -0.287025 0 -0.5 0
  [5,24,-0.2651625,-0.45,-0.2651625,-0.3464625,-0.45,-0.1435125,-0.692925,-0.225,-0.287025,0,-0.5,0],
// 5 24 -0.3464625 -0.45 -0.1435125 -0.375 -0.45 0 -0.75 -0.225 0 0 -0.5 0
  [5,24,-0.3464625,-0.45,-0.1435125,-0.375,-0.45,0,-0.75,-0.225,0,0,-0.5,0],
// 5 24 -0.375 -0.45 0 -0.3464625 -0.45 0.1435125 -0.692925 -0.225 0.287025 0 -0.5 0
  [5,24,-0.375,-0.45,0,-0.3464625,-0.45,0.1435125,-0.692925,-0.225,0.287025,0,-0.5,0],
// 5 24 -0.3464625 -0.45 0.1435125 -0.2651625 -0.45 0.2651625 -0.530325 -0.225 0.530325 0 -0.5 0
  [5,24,-0.3464625,-0.45,0.1435125,-0.2651625,-0.45,0.2651625,-0.530325,-0.225,0.530325,0,-0.5,0],
// 5 24 -0.2651625 -0.45 0.2651625 -0.1435125 -0.45 0.3464625 -0.287025 -0.225 0.692925 0 -0.5 0
  [5,24,-0.2651625,-0.45,0.2651625,-0.1435125,-0.45,0.3464625,-0.287025,-0.225,0.692925,0,-0.5,0],
// 5 24 -0.1435125 -0.45 0.3464625 0 -0.45 0.375 0 -0.225 0.75 0 -0.5 0
  [5,24,-0.1435125,-0.45,0.3464625,0,-0.45,0.375,0,-0.225,0.75,0,-0.5,0],
// 5 24 0 -0.45 0.375 0.1435125 -0.45 0.3464625 0.287025 -0.225 0.692925 0 -0.5 0
  [5,24,0,-0.45,0.375,0.1435125,-0.45,0.3464625,0.287025,-0.225,0.692925,0,-0.5,0],
// 5 24 0.1435125 -0.45 0.3464625 0.2651625 -0.45 0.2651625 0.530325 -0.225 0.530325 0 -0.5 0
  [5,24,0.1435125,-0.45,0.3464625,0.2651625,-0.45,0.2651625,0.530325,-0.225,0.530325,0,-0.5,0],
// 5 24 0.2651625 -0.45 0.2651625 0.3464625 -0.45 0.1435125 0.692925 -0.225 0.287025 0 -0.5 0
  [5,24,0.2651625,-0.45,0.2651625,0.3464625,-0.45,0.1435125,0.692925,-0.225,0.287025,0,-0.5,0],
// 5 24 0.3464625 -0.45 0.1435125 0.375 -0.45 0 0.75 -0.225 0 0 -0.5 0
  [5,24,0.3464625,-0.45,0.1435125,0.375,-0.45,0,0.75,-0.225,0,0,-0.5,0],
// 5 24 0.375 -0.45 0 0.3464625 -0.45 -0.1435125 0.692925 -0.225 -0.287025 0 -0.5 0
  [5,24,0.375,-0.45,0,0.3464625,-0.45,-0.1435125,0.692925,-0.225,-0.287025,0,-0.5,0],
// 5 24 0.3464625 -0.45 -0.1435125 0.2651625 -0.45 -0.2651625 0.530325 -0.225 -0.530325 0 -0.5 0
  [5,24,0.3464625,-0.45,-0.1435125,0.2651625,-0.45,-0.2651625,0.530325,-0.225,-0.530325,0,-0.5,0],
// 5 24 0.2651625 -0.45 -0.2651625 0.1435125 -0.45 -0.3464625 0.287025 -0.225 -0.692925 0 -0.5 0
  [5,24,0.2651625,-0.45,-0.2651625,0.1435125,-0.45,-0.3464625,0.287025,-0.225,-0.692925,0,-0.5,0],
// 5 24 0.1435125 -0.45 -0.3464625 0 -0.45 -0.375 0 -0.225 -0.75 0 -0.5 0
  [5,24,0.1435125,-0.45,-0.3464625,0,-0.45,-0.375,0,-0.225,-0.75,0,-0.5,0],
];
module ldraw_lib__bump5000(step=0, col=false, unit=2/5, alt=false, line=0.2, solid=!$preview)
    makepoly(ldraw_lib__bump5000(), step=step, col=col, unit=unit, alt=alt, line=line, solid=solid);
ldraw_lib__bump5000(line=0.2);
// file: ../../p/1-4con0.scad
use <../lib.scad>
function ldraw_lib__1_4con0() = [
// 0 Cone  0 x 0.25
// 0 Name: 1-4con0.dat
// 0 Author: Bernd Broich [bbroich]
// 0 !LDRAW_ORG Primitive UPDATE 2012-01
// 0 !LICENSE Licensed under CC BY 2.0 and CC BY 4.0 : see CAreadme.txt
// 
// 0 BFC CERTIFY CCW
  [0,"BFC","CERTIFY"],
  [0,"BFC","CCW"],
// 
// 0 !HISTORY 2002-11-30 [PTadmin] Official Update 2002-05
// 0 !HISTORY 2007-06-22 [PTadmin] Header formatted for Contributor Agreement
// 0 !HISTORY 2008-07-01 [PTadmin] Official Update 2008-01
// 0 !HISTORY 2012-02-16 [Philo] Changed to CCW. Corrected tangent condlines control points
// 0 !HISTORY 2012-03-30 [PTadmin] Official Update 2012-01
// 
// 
// 3 16 0 1 0 0.9239 0 0.3827 1 0 0
  [3,16,0,1,0,0.9239,0,0.3827,1,0,0],
// 3 16 0 1 0 0.7071 0 0.7071 0.9239 0 0.3827
  [3,16,0,1,0,0.7071,0,0.7071,0.9239,0,0.3827],
// 3 16 0 1 0 0.3827 0 0.9239 0.7071 0 0.7071
  [3,16,0,1,0,0.3827,0,0.9239,0.7071,0,0.7071],
// 3 16 0 1 0 0 0 1 0.3827 0 0.9239
  [3,16,0,1,0,0,0,1,0.3827,0,0.9239],
// 5 24 0 0 1 0 1 0 -0.3 0 1 0.3827 0 0.9239
  [5,24,0,0,1,0,1,0,-0.3,0,1,0.3827,0,0.9239],
// 5 24 0.3827 0 0.9239 0 1 0 0 0 1 0.7071 0 0.7071
  [5,24,0.3827,0,0.9239,0,1,0,0,0,1,0.7071,0,0.7071],
// 5 24 0.7071 0 0.7071 0 1 0 0.3827 0 0.9239 0.9239 0 0.3827
  [5,24,0.7071,0,0.7071,0,1,0,0.3827,0,0.9239,0.9239,0,0.3827],
// 5 24 0.9239 0 0.3827 0 1 0 0.7071 0 0.7071 1 0 0
  [5,24,0.9239,0,0.3827,0,1,0,0.7071,0,0.7071,1,0,0],
// 5 24 1 0 0 0 1 0 0.9239 0 0.3827 1 0 -0.3
  [5,24,1,0,0,0,1,0,0.9239,0,0.3827,1,0,-0.3],
];
module ldraw_lib__1_4con0(step=0, col=false, unit=2/5, alt=false, line=0.2, solid=!$preview)
    makepoly(ldraw_lib__1_4con0(), step=step, col=col, unit=unit, alt=alt, line=line, solid=solid);
ldraw_lib__1_4con0(line=0.2);
// main file
use <../../lib.scad>
use <../../p/1-4con0.scad>
use <../../p/bump5000.scad>
function ldraw_lib__s__79735s01() = [
// 0 ~Minifig Chopsticks Stick
// 0 Name: s\79735s01.dat
// 0 Author: Philippe Hurbain [Philo]
// 0 !LDRAW_ORG Subpart UPDATE 2023-04
// 0 !LICENSE Licensed under CC BY 4.0 : see CAreadme.txt
// 
// 0 BFC CERTIFY CCW
  [0,"BFC","CERTIFY"],
  [0,"BFC","CCW"],
// 
// 0 !HISTORY 2023-08-25 [OrionP] Official Update 2023-04
// 
// 
// 2 24 -2.8 -36.3 2.8 0 -39.4 0
  [2,24,-2.8,-36.3,2.8,0,-39.4,0],
// 2 24 2.8 -36.3 2.8 0 -39.4 0
  [2,24,2.8,-36.3,2.8,0,-39.4,0],
// 2 24 2.8 -36.3 -2.8 0 -39.4 0
  [2,24,2.8,-36.3,-2.8,0,-39.4,0],
// 2 24 -2.8 -36.3 -2.8 0 -39.4 0
  [2,24,-2.8,-36.3,-2.8,0,-39.4,0],
// 1 16 0 -0.5 0 1.5 0 0 0 -1 0 0 0 1.5 bump5000.dat
  [1,16,0,-0.5,0,1.5,0,0,0,-1,0,0,0,1.5, ldraw_lib__bump5000()],
// 2 24 -2.8 -36.3 -2.8 2.8 -36.3 -2.8
  [2,24,-2.8,-36.3,-2.8,2.8,-36.3,-2.8],
// 2 24 -2.8 -36.3 2.8 2.8 -36.3 2.8
  [2,24,-2.8,-36.3,2.8,2.8,-36.3,2.8],
// 2 24 -2.8 -36.3 -2.8 -2.8 -36.3 2.8
  [2,24,-2.8,-36.3,-2.8,-2.8,-36.3,2.8],
// 2 24 2.8 -36.3 -2.8 2.8 -36.3 2.8
  [2,24,2.8,-36.3,-2.8,2.8,-36.3,2.8],
// 3 16 2.8 -36.3 -2.8 2.8 -36.3 2.8 0 -39.4 0
  [3,16,2.8,-36.3,-2.8,2.8,-36.3,2.8,0,-39.4,0],
// 3 16 0 -39.4 0 -2.8 -36.3 -2.8 2.8 -36.3 -2.8
  [3,16,0,-39.4,0,-2.8,-36.3,-2.8,2.8,-36.3,-2.8],
// 3 16 -2.8 -36.3 2.8 -2.8 -36.3 -2.8 0 -39.4 0
  [3,16,-2.8,-36.3,2.8,-2.8,-36.3,-2.8,0,-39.4,0],
// 3 16 2.8 -36.3 2.8 -2.8 -36.3 2.8 0 -39.4 0
  [3,16,2.8,-36.3,2.8,-2.8,-36.3,2.8,0,-39.4,0],
// 2 24 2.251 -25 2.251 2.8 -36.3 2.8
  [2,24,2.251,-25,2.251,2.8,-36.3,2.8],
// 2 24 -2.8 -36.3 2.8 -2.251 -25 2.251
  [2,24,-2.8,-36.3,2.8,-2.251,-25,2.251],
// 1 16 0 -0.5 0 1.5 2.25099 0 0 -24.5 0 0 2.25099 1.5 1-4con0.dat
  [1,16,0,-0.5,0,1.5,2.25099,0,0,-24.5,0,0,2.25099,1.5, ldraw_lib__1_4con0()],
// 2 24 2.251 -25 -2.251 2.8 -36.3 -2.8
  [2,24,2.251,-25,-2.251,2.8,-36.3,-2.8],
// 1 16 0 -0.5 0 0 2.25099 1.5 0 -24.5 0 -1.5 -2.25099 0 1-4con0.dat
  [1,16,0,-0.5,0,0,2.25099,1.5,0,-24.5,0,-1.5,-2.25099,0, ldraw_lib__1_4con0()],
// 2 24 -2.251 -25 -2.251 -2.8 -36.3 -2.8
  [2,24,-2.251,-25,-2.251,-2.8,-36.3,-2.8],
// 1 16 0 -0.5 0 -1.5 -2.25099 0 0 -24.5 0 0 -2.25099 -1.5 1-4con0.dat
  [1,16,0,-0.5,0,-1.5,-2.25099,0,0,-24.5,0,0,-2.25099,-1.5, ldraw_lib__1_4con0()],
// 1 16 0 -0.5 0 0 -2.25099 -1.5 0 -24.5 0 1.5 2.25099 0 1-4con0.dat
  [1,16,0,-0.5,0,0,-2.25099,-1.5,0,-24.5,0,1.5,2.25099,0, ldraw_lib__1_4con0()],
// 
// 3 16 2.8 -36.3 2.8 2.251 -25 2.251 0 -25 2.251
  [3,16,2.8,-36.3,2.8,2.251,-25,2.251,0,-25,2.251],
// 3 16 0 -25 2.251 -2.8 -36.3 2.8 2.8 -36.3 2.8
  [3,16,0,-25,2.251,-2.8,-36.3,2.8,2.8,-36.3,2.8],
// 3 16 0 -25 2.251 -2.251 -25 2.251 -2.8 -36.3 2.8
  [3,16,0,-25,2.251,-2.251,-25,2.251,-2.8,-36.3,2.8],
// 3 16 0 -25 2.251 2.251 -25 2.251 0 -0.5 1.5
  [3,16,0,-25,2.251,2.251,-25,2.251,0,-0.5,1.5],
// 3 16 -2.251 -25 2.251 0 -25 2.251 0 -0.5 1.5
  [3,16,-2.251,-25,2.251,0,-25,2.251,0,-0.5,1.5],
// 5 24 -2.251 -25 2.251 0 -25 2.251 -2.8 -36.3 2.8 0 -0.5 1.5
  [5,24,-2.251,-25,2.251,0,-25,2.251,-2.8,-36.3,2.8,0,-0.5,1.5],
// 5 24 2.251 -25 2.251 0 -25 2.251 2.8 -36.3 2.8 0 -0.5 1.5
  [5,24,2.251,-25,2.251,0,-25,2.251,2.8,-36.3,2.8,0,-0.5,1.5],
// 3 16 2.8 -36.3 -2.8 2.251 -25 -2.251 2.251 -25 0
  [3,16,2.8,-36.3,-2.8,2.251,-25,-2.251,2.251,-25,0],
// 3 16 2.251 -25 0 2.8 -36.3 2.8 2.8 -36.3 -2.8
  [3,16,2.251,-25,0,2.8,-36.3,2.8,2.8,-36.3,-2.8],
// 3 16 2.251 -25 0 2.251 -25 2.251 2.8 -36.3 2.8
  [3,16,2.251,-25,0,2.251,-25,2.251,2.8,-36.3,2.8],
// 3 16 2.251 -25 0 2.251 -25 -2.251 1.5 -0.5 0
  [3,16,2.251,-25,0,2.251,-25,-2.251,1.5,-0.5,0],
// 3 16 2.251 -25 2.251 2.251 -25 0 1.5 -0.5 0
  [3,16,2.251,-25,2.251,2.251,-25,0,1.5,-0.5,0],
// 5 24 2.251 -25 2.251 2.251 -25 0 2.8 -36.3 2.8 1.5 -0.5 0
  [5,24,2.251,-25,2.251,2.251,-25,0,2.8,-36.3,2.8,1.5,-0.5,0],
// 5 24 2.251 -25 -2.251 2.251 -25 0 2.8 -36.3 -2.8 1.5 -0.5 0
  [5,24,2.251,-25,-2.251,2.251,-25,0,2.8,-36.3,-2.8,1.5,-0.5,0],
// 3 16 -2.8 -36.3 -2.8 -2.251 -25 -2.251 0 -25 -2.251
  [3,16,-2.8,-36.3,-2.8,-2.251,-25,-2.251,0,-25,-2.251],
// 3 16 0 -25 -2.251 2.8 -36.3 -2.8 -2.8 -36.3 -2.8
  [3,16,0,-25,-2.251,2.8,-36.3,-2.8,-2.8,-36.3,-2.8],
// 3 16 0 -25 -2.251 2.251 -25 -2.251 2.8 -36.3 -2.8
  [3,16,0,-25,-2.251,2.251,-25,-2.251,2.8,-36.3,-2.8],
// 3 16 0 -25 -2.251 -2.251 -25 -2.251 0 -0.5 -1.5
  [3,16,0,-25,-2.251,-2.251,-25,-2.251,0,-0.5,-1.5],
// 3 16 2.251 -25 -2.251 0 -25 -2.251 0 -0.5 -1.5
  [3,16,2.251,-25,-2.251,0,-25,-2.251,0,-0.5,-1.5],
// 5 24 2.251 -25 -2.251 0 -25 -2.251 2.8 -36.3 -2.8 0 -0.5 -1.5
  [5,24,2.251,-25,-2.251,0,-25,-2.251,2.8,-36.3,-2.8,0,-0.5,-1.5],
// 5 24 -2.251 -25 -2.251 0 -25 -2.251 -2.8 -36.3 -2.8 0 -0.5 -1.5
  [5,24,-2.251,-25,-2.251,0,-25,-2.251,-2.8,-36.3,-2.8,0,-0.5,-1.5],
// 3 16 -2.8 -36.3 2.8 -2.251 -25 2.251 -2.251 -25 0
  [3,16,-2.8,-36.3,2.8,-2.251,-25,2.251,-2.251,-25,0],
// 3 16 -2.251 -25 0 -2.8 -36.3 -2.8 -2.8 -36.3 2.8
  [3,16,-2.251,-25,0,-2.8,-36.3,-2.8,-2.8,-36.3,2.8],
// 3 16 -2.251 -25 0 -2.251 -25 -2.251 -2.8 -36.3 -2.8
  [3,16,-2.251,-25,0,-2.251,-25,-2.251,-2.8,-36.3,-2.8],
// 3 16 -2.251 -25 0 -2.251 -25 2.251 -1.5 -0.5 0
  [3,16,-2.251,-25,0,-2.251,-25,2.251,-1.5,-0.5,0],
// 3 16 -2.251 -25 -2.251 -2.251 -25 0 -1.5 -0.5 0
  [3,16,-2.251,-25,-2.251,-2.251,-25,0,-1.5,-0.5,0],
// 5 24 -2.251 -25 -2.251 -2.251 -25 0 -2.8 -36.3 -2.8 -1.5 -0.5 0
  [5,24,-2.251,-25,-2.251,-2.251,-25,0,-2.8,-36.3,-2.8,-1.5,-0.5,0],
// 5 24 -2.251 -25 2.251 -2.251 -25 0 -2.8 -36.3 2.8 -1.5 -0.5 0
  [5,24,-2.251,-25,2.251,-2.251,-25,0,-2.8,-36.3,2.8,-1.5,-0.5,0],
];
module ldraw_lib__s__79735s01(step=0, col=false, unit=2/5, alt=false, line=0.2, solid=!$preview)
    makepoly(ldraw_lib__s__79735s01(), step=step, col=col, unit=unit, alt=alt, line=line, solid=solid);
ldraw_lib__s__79735s01(line=0.2);
